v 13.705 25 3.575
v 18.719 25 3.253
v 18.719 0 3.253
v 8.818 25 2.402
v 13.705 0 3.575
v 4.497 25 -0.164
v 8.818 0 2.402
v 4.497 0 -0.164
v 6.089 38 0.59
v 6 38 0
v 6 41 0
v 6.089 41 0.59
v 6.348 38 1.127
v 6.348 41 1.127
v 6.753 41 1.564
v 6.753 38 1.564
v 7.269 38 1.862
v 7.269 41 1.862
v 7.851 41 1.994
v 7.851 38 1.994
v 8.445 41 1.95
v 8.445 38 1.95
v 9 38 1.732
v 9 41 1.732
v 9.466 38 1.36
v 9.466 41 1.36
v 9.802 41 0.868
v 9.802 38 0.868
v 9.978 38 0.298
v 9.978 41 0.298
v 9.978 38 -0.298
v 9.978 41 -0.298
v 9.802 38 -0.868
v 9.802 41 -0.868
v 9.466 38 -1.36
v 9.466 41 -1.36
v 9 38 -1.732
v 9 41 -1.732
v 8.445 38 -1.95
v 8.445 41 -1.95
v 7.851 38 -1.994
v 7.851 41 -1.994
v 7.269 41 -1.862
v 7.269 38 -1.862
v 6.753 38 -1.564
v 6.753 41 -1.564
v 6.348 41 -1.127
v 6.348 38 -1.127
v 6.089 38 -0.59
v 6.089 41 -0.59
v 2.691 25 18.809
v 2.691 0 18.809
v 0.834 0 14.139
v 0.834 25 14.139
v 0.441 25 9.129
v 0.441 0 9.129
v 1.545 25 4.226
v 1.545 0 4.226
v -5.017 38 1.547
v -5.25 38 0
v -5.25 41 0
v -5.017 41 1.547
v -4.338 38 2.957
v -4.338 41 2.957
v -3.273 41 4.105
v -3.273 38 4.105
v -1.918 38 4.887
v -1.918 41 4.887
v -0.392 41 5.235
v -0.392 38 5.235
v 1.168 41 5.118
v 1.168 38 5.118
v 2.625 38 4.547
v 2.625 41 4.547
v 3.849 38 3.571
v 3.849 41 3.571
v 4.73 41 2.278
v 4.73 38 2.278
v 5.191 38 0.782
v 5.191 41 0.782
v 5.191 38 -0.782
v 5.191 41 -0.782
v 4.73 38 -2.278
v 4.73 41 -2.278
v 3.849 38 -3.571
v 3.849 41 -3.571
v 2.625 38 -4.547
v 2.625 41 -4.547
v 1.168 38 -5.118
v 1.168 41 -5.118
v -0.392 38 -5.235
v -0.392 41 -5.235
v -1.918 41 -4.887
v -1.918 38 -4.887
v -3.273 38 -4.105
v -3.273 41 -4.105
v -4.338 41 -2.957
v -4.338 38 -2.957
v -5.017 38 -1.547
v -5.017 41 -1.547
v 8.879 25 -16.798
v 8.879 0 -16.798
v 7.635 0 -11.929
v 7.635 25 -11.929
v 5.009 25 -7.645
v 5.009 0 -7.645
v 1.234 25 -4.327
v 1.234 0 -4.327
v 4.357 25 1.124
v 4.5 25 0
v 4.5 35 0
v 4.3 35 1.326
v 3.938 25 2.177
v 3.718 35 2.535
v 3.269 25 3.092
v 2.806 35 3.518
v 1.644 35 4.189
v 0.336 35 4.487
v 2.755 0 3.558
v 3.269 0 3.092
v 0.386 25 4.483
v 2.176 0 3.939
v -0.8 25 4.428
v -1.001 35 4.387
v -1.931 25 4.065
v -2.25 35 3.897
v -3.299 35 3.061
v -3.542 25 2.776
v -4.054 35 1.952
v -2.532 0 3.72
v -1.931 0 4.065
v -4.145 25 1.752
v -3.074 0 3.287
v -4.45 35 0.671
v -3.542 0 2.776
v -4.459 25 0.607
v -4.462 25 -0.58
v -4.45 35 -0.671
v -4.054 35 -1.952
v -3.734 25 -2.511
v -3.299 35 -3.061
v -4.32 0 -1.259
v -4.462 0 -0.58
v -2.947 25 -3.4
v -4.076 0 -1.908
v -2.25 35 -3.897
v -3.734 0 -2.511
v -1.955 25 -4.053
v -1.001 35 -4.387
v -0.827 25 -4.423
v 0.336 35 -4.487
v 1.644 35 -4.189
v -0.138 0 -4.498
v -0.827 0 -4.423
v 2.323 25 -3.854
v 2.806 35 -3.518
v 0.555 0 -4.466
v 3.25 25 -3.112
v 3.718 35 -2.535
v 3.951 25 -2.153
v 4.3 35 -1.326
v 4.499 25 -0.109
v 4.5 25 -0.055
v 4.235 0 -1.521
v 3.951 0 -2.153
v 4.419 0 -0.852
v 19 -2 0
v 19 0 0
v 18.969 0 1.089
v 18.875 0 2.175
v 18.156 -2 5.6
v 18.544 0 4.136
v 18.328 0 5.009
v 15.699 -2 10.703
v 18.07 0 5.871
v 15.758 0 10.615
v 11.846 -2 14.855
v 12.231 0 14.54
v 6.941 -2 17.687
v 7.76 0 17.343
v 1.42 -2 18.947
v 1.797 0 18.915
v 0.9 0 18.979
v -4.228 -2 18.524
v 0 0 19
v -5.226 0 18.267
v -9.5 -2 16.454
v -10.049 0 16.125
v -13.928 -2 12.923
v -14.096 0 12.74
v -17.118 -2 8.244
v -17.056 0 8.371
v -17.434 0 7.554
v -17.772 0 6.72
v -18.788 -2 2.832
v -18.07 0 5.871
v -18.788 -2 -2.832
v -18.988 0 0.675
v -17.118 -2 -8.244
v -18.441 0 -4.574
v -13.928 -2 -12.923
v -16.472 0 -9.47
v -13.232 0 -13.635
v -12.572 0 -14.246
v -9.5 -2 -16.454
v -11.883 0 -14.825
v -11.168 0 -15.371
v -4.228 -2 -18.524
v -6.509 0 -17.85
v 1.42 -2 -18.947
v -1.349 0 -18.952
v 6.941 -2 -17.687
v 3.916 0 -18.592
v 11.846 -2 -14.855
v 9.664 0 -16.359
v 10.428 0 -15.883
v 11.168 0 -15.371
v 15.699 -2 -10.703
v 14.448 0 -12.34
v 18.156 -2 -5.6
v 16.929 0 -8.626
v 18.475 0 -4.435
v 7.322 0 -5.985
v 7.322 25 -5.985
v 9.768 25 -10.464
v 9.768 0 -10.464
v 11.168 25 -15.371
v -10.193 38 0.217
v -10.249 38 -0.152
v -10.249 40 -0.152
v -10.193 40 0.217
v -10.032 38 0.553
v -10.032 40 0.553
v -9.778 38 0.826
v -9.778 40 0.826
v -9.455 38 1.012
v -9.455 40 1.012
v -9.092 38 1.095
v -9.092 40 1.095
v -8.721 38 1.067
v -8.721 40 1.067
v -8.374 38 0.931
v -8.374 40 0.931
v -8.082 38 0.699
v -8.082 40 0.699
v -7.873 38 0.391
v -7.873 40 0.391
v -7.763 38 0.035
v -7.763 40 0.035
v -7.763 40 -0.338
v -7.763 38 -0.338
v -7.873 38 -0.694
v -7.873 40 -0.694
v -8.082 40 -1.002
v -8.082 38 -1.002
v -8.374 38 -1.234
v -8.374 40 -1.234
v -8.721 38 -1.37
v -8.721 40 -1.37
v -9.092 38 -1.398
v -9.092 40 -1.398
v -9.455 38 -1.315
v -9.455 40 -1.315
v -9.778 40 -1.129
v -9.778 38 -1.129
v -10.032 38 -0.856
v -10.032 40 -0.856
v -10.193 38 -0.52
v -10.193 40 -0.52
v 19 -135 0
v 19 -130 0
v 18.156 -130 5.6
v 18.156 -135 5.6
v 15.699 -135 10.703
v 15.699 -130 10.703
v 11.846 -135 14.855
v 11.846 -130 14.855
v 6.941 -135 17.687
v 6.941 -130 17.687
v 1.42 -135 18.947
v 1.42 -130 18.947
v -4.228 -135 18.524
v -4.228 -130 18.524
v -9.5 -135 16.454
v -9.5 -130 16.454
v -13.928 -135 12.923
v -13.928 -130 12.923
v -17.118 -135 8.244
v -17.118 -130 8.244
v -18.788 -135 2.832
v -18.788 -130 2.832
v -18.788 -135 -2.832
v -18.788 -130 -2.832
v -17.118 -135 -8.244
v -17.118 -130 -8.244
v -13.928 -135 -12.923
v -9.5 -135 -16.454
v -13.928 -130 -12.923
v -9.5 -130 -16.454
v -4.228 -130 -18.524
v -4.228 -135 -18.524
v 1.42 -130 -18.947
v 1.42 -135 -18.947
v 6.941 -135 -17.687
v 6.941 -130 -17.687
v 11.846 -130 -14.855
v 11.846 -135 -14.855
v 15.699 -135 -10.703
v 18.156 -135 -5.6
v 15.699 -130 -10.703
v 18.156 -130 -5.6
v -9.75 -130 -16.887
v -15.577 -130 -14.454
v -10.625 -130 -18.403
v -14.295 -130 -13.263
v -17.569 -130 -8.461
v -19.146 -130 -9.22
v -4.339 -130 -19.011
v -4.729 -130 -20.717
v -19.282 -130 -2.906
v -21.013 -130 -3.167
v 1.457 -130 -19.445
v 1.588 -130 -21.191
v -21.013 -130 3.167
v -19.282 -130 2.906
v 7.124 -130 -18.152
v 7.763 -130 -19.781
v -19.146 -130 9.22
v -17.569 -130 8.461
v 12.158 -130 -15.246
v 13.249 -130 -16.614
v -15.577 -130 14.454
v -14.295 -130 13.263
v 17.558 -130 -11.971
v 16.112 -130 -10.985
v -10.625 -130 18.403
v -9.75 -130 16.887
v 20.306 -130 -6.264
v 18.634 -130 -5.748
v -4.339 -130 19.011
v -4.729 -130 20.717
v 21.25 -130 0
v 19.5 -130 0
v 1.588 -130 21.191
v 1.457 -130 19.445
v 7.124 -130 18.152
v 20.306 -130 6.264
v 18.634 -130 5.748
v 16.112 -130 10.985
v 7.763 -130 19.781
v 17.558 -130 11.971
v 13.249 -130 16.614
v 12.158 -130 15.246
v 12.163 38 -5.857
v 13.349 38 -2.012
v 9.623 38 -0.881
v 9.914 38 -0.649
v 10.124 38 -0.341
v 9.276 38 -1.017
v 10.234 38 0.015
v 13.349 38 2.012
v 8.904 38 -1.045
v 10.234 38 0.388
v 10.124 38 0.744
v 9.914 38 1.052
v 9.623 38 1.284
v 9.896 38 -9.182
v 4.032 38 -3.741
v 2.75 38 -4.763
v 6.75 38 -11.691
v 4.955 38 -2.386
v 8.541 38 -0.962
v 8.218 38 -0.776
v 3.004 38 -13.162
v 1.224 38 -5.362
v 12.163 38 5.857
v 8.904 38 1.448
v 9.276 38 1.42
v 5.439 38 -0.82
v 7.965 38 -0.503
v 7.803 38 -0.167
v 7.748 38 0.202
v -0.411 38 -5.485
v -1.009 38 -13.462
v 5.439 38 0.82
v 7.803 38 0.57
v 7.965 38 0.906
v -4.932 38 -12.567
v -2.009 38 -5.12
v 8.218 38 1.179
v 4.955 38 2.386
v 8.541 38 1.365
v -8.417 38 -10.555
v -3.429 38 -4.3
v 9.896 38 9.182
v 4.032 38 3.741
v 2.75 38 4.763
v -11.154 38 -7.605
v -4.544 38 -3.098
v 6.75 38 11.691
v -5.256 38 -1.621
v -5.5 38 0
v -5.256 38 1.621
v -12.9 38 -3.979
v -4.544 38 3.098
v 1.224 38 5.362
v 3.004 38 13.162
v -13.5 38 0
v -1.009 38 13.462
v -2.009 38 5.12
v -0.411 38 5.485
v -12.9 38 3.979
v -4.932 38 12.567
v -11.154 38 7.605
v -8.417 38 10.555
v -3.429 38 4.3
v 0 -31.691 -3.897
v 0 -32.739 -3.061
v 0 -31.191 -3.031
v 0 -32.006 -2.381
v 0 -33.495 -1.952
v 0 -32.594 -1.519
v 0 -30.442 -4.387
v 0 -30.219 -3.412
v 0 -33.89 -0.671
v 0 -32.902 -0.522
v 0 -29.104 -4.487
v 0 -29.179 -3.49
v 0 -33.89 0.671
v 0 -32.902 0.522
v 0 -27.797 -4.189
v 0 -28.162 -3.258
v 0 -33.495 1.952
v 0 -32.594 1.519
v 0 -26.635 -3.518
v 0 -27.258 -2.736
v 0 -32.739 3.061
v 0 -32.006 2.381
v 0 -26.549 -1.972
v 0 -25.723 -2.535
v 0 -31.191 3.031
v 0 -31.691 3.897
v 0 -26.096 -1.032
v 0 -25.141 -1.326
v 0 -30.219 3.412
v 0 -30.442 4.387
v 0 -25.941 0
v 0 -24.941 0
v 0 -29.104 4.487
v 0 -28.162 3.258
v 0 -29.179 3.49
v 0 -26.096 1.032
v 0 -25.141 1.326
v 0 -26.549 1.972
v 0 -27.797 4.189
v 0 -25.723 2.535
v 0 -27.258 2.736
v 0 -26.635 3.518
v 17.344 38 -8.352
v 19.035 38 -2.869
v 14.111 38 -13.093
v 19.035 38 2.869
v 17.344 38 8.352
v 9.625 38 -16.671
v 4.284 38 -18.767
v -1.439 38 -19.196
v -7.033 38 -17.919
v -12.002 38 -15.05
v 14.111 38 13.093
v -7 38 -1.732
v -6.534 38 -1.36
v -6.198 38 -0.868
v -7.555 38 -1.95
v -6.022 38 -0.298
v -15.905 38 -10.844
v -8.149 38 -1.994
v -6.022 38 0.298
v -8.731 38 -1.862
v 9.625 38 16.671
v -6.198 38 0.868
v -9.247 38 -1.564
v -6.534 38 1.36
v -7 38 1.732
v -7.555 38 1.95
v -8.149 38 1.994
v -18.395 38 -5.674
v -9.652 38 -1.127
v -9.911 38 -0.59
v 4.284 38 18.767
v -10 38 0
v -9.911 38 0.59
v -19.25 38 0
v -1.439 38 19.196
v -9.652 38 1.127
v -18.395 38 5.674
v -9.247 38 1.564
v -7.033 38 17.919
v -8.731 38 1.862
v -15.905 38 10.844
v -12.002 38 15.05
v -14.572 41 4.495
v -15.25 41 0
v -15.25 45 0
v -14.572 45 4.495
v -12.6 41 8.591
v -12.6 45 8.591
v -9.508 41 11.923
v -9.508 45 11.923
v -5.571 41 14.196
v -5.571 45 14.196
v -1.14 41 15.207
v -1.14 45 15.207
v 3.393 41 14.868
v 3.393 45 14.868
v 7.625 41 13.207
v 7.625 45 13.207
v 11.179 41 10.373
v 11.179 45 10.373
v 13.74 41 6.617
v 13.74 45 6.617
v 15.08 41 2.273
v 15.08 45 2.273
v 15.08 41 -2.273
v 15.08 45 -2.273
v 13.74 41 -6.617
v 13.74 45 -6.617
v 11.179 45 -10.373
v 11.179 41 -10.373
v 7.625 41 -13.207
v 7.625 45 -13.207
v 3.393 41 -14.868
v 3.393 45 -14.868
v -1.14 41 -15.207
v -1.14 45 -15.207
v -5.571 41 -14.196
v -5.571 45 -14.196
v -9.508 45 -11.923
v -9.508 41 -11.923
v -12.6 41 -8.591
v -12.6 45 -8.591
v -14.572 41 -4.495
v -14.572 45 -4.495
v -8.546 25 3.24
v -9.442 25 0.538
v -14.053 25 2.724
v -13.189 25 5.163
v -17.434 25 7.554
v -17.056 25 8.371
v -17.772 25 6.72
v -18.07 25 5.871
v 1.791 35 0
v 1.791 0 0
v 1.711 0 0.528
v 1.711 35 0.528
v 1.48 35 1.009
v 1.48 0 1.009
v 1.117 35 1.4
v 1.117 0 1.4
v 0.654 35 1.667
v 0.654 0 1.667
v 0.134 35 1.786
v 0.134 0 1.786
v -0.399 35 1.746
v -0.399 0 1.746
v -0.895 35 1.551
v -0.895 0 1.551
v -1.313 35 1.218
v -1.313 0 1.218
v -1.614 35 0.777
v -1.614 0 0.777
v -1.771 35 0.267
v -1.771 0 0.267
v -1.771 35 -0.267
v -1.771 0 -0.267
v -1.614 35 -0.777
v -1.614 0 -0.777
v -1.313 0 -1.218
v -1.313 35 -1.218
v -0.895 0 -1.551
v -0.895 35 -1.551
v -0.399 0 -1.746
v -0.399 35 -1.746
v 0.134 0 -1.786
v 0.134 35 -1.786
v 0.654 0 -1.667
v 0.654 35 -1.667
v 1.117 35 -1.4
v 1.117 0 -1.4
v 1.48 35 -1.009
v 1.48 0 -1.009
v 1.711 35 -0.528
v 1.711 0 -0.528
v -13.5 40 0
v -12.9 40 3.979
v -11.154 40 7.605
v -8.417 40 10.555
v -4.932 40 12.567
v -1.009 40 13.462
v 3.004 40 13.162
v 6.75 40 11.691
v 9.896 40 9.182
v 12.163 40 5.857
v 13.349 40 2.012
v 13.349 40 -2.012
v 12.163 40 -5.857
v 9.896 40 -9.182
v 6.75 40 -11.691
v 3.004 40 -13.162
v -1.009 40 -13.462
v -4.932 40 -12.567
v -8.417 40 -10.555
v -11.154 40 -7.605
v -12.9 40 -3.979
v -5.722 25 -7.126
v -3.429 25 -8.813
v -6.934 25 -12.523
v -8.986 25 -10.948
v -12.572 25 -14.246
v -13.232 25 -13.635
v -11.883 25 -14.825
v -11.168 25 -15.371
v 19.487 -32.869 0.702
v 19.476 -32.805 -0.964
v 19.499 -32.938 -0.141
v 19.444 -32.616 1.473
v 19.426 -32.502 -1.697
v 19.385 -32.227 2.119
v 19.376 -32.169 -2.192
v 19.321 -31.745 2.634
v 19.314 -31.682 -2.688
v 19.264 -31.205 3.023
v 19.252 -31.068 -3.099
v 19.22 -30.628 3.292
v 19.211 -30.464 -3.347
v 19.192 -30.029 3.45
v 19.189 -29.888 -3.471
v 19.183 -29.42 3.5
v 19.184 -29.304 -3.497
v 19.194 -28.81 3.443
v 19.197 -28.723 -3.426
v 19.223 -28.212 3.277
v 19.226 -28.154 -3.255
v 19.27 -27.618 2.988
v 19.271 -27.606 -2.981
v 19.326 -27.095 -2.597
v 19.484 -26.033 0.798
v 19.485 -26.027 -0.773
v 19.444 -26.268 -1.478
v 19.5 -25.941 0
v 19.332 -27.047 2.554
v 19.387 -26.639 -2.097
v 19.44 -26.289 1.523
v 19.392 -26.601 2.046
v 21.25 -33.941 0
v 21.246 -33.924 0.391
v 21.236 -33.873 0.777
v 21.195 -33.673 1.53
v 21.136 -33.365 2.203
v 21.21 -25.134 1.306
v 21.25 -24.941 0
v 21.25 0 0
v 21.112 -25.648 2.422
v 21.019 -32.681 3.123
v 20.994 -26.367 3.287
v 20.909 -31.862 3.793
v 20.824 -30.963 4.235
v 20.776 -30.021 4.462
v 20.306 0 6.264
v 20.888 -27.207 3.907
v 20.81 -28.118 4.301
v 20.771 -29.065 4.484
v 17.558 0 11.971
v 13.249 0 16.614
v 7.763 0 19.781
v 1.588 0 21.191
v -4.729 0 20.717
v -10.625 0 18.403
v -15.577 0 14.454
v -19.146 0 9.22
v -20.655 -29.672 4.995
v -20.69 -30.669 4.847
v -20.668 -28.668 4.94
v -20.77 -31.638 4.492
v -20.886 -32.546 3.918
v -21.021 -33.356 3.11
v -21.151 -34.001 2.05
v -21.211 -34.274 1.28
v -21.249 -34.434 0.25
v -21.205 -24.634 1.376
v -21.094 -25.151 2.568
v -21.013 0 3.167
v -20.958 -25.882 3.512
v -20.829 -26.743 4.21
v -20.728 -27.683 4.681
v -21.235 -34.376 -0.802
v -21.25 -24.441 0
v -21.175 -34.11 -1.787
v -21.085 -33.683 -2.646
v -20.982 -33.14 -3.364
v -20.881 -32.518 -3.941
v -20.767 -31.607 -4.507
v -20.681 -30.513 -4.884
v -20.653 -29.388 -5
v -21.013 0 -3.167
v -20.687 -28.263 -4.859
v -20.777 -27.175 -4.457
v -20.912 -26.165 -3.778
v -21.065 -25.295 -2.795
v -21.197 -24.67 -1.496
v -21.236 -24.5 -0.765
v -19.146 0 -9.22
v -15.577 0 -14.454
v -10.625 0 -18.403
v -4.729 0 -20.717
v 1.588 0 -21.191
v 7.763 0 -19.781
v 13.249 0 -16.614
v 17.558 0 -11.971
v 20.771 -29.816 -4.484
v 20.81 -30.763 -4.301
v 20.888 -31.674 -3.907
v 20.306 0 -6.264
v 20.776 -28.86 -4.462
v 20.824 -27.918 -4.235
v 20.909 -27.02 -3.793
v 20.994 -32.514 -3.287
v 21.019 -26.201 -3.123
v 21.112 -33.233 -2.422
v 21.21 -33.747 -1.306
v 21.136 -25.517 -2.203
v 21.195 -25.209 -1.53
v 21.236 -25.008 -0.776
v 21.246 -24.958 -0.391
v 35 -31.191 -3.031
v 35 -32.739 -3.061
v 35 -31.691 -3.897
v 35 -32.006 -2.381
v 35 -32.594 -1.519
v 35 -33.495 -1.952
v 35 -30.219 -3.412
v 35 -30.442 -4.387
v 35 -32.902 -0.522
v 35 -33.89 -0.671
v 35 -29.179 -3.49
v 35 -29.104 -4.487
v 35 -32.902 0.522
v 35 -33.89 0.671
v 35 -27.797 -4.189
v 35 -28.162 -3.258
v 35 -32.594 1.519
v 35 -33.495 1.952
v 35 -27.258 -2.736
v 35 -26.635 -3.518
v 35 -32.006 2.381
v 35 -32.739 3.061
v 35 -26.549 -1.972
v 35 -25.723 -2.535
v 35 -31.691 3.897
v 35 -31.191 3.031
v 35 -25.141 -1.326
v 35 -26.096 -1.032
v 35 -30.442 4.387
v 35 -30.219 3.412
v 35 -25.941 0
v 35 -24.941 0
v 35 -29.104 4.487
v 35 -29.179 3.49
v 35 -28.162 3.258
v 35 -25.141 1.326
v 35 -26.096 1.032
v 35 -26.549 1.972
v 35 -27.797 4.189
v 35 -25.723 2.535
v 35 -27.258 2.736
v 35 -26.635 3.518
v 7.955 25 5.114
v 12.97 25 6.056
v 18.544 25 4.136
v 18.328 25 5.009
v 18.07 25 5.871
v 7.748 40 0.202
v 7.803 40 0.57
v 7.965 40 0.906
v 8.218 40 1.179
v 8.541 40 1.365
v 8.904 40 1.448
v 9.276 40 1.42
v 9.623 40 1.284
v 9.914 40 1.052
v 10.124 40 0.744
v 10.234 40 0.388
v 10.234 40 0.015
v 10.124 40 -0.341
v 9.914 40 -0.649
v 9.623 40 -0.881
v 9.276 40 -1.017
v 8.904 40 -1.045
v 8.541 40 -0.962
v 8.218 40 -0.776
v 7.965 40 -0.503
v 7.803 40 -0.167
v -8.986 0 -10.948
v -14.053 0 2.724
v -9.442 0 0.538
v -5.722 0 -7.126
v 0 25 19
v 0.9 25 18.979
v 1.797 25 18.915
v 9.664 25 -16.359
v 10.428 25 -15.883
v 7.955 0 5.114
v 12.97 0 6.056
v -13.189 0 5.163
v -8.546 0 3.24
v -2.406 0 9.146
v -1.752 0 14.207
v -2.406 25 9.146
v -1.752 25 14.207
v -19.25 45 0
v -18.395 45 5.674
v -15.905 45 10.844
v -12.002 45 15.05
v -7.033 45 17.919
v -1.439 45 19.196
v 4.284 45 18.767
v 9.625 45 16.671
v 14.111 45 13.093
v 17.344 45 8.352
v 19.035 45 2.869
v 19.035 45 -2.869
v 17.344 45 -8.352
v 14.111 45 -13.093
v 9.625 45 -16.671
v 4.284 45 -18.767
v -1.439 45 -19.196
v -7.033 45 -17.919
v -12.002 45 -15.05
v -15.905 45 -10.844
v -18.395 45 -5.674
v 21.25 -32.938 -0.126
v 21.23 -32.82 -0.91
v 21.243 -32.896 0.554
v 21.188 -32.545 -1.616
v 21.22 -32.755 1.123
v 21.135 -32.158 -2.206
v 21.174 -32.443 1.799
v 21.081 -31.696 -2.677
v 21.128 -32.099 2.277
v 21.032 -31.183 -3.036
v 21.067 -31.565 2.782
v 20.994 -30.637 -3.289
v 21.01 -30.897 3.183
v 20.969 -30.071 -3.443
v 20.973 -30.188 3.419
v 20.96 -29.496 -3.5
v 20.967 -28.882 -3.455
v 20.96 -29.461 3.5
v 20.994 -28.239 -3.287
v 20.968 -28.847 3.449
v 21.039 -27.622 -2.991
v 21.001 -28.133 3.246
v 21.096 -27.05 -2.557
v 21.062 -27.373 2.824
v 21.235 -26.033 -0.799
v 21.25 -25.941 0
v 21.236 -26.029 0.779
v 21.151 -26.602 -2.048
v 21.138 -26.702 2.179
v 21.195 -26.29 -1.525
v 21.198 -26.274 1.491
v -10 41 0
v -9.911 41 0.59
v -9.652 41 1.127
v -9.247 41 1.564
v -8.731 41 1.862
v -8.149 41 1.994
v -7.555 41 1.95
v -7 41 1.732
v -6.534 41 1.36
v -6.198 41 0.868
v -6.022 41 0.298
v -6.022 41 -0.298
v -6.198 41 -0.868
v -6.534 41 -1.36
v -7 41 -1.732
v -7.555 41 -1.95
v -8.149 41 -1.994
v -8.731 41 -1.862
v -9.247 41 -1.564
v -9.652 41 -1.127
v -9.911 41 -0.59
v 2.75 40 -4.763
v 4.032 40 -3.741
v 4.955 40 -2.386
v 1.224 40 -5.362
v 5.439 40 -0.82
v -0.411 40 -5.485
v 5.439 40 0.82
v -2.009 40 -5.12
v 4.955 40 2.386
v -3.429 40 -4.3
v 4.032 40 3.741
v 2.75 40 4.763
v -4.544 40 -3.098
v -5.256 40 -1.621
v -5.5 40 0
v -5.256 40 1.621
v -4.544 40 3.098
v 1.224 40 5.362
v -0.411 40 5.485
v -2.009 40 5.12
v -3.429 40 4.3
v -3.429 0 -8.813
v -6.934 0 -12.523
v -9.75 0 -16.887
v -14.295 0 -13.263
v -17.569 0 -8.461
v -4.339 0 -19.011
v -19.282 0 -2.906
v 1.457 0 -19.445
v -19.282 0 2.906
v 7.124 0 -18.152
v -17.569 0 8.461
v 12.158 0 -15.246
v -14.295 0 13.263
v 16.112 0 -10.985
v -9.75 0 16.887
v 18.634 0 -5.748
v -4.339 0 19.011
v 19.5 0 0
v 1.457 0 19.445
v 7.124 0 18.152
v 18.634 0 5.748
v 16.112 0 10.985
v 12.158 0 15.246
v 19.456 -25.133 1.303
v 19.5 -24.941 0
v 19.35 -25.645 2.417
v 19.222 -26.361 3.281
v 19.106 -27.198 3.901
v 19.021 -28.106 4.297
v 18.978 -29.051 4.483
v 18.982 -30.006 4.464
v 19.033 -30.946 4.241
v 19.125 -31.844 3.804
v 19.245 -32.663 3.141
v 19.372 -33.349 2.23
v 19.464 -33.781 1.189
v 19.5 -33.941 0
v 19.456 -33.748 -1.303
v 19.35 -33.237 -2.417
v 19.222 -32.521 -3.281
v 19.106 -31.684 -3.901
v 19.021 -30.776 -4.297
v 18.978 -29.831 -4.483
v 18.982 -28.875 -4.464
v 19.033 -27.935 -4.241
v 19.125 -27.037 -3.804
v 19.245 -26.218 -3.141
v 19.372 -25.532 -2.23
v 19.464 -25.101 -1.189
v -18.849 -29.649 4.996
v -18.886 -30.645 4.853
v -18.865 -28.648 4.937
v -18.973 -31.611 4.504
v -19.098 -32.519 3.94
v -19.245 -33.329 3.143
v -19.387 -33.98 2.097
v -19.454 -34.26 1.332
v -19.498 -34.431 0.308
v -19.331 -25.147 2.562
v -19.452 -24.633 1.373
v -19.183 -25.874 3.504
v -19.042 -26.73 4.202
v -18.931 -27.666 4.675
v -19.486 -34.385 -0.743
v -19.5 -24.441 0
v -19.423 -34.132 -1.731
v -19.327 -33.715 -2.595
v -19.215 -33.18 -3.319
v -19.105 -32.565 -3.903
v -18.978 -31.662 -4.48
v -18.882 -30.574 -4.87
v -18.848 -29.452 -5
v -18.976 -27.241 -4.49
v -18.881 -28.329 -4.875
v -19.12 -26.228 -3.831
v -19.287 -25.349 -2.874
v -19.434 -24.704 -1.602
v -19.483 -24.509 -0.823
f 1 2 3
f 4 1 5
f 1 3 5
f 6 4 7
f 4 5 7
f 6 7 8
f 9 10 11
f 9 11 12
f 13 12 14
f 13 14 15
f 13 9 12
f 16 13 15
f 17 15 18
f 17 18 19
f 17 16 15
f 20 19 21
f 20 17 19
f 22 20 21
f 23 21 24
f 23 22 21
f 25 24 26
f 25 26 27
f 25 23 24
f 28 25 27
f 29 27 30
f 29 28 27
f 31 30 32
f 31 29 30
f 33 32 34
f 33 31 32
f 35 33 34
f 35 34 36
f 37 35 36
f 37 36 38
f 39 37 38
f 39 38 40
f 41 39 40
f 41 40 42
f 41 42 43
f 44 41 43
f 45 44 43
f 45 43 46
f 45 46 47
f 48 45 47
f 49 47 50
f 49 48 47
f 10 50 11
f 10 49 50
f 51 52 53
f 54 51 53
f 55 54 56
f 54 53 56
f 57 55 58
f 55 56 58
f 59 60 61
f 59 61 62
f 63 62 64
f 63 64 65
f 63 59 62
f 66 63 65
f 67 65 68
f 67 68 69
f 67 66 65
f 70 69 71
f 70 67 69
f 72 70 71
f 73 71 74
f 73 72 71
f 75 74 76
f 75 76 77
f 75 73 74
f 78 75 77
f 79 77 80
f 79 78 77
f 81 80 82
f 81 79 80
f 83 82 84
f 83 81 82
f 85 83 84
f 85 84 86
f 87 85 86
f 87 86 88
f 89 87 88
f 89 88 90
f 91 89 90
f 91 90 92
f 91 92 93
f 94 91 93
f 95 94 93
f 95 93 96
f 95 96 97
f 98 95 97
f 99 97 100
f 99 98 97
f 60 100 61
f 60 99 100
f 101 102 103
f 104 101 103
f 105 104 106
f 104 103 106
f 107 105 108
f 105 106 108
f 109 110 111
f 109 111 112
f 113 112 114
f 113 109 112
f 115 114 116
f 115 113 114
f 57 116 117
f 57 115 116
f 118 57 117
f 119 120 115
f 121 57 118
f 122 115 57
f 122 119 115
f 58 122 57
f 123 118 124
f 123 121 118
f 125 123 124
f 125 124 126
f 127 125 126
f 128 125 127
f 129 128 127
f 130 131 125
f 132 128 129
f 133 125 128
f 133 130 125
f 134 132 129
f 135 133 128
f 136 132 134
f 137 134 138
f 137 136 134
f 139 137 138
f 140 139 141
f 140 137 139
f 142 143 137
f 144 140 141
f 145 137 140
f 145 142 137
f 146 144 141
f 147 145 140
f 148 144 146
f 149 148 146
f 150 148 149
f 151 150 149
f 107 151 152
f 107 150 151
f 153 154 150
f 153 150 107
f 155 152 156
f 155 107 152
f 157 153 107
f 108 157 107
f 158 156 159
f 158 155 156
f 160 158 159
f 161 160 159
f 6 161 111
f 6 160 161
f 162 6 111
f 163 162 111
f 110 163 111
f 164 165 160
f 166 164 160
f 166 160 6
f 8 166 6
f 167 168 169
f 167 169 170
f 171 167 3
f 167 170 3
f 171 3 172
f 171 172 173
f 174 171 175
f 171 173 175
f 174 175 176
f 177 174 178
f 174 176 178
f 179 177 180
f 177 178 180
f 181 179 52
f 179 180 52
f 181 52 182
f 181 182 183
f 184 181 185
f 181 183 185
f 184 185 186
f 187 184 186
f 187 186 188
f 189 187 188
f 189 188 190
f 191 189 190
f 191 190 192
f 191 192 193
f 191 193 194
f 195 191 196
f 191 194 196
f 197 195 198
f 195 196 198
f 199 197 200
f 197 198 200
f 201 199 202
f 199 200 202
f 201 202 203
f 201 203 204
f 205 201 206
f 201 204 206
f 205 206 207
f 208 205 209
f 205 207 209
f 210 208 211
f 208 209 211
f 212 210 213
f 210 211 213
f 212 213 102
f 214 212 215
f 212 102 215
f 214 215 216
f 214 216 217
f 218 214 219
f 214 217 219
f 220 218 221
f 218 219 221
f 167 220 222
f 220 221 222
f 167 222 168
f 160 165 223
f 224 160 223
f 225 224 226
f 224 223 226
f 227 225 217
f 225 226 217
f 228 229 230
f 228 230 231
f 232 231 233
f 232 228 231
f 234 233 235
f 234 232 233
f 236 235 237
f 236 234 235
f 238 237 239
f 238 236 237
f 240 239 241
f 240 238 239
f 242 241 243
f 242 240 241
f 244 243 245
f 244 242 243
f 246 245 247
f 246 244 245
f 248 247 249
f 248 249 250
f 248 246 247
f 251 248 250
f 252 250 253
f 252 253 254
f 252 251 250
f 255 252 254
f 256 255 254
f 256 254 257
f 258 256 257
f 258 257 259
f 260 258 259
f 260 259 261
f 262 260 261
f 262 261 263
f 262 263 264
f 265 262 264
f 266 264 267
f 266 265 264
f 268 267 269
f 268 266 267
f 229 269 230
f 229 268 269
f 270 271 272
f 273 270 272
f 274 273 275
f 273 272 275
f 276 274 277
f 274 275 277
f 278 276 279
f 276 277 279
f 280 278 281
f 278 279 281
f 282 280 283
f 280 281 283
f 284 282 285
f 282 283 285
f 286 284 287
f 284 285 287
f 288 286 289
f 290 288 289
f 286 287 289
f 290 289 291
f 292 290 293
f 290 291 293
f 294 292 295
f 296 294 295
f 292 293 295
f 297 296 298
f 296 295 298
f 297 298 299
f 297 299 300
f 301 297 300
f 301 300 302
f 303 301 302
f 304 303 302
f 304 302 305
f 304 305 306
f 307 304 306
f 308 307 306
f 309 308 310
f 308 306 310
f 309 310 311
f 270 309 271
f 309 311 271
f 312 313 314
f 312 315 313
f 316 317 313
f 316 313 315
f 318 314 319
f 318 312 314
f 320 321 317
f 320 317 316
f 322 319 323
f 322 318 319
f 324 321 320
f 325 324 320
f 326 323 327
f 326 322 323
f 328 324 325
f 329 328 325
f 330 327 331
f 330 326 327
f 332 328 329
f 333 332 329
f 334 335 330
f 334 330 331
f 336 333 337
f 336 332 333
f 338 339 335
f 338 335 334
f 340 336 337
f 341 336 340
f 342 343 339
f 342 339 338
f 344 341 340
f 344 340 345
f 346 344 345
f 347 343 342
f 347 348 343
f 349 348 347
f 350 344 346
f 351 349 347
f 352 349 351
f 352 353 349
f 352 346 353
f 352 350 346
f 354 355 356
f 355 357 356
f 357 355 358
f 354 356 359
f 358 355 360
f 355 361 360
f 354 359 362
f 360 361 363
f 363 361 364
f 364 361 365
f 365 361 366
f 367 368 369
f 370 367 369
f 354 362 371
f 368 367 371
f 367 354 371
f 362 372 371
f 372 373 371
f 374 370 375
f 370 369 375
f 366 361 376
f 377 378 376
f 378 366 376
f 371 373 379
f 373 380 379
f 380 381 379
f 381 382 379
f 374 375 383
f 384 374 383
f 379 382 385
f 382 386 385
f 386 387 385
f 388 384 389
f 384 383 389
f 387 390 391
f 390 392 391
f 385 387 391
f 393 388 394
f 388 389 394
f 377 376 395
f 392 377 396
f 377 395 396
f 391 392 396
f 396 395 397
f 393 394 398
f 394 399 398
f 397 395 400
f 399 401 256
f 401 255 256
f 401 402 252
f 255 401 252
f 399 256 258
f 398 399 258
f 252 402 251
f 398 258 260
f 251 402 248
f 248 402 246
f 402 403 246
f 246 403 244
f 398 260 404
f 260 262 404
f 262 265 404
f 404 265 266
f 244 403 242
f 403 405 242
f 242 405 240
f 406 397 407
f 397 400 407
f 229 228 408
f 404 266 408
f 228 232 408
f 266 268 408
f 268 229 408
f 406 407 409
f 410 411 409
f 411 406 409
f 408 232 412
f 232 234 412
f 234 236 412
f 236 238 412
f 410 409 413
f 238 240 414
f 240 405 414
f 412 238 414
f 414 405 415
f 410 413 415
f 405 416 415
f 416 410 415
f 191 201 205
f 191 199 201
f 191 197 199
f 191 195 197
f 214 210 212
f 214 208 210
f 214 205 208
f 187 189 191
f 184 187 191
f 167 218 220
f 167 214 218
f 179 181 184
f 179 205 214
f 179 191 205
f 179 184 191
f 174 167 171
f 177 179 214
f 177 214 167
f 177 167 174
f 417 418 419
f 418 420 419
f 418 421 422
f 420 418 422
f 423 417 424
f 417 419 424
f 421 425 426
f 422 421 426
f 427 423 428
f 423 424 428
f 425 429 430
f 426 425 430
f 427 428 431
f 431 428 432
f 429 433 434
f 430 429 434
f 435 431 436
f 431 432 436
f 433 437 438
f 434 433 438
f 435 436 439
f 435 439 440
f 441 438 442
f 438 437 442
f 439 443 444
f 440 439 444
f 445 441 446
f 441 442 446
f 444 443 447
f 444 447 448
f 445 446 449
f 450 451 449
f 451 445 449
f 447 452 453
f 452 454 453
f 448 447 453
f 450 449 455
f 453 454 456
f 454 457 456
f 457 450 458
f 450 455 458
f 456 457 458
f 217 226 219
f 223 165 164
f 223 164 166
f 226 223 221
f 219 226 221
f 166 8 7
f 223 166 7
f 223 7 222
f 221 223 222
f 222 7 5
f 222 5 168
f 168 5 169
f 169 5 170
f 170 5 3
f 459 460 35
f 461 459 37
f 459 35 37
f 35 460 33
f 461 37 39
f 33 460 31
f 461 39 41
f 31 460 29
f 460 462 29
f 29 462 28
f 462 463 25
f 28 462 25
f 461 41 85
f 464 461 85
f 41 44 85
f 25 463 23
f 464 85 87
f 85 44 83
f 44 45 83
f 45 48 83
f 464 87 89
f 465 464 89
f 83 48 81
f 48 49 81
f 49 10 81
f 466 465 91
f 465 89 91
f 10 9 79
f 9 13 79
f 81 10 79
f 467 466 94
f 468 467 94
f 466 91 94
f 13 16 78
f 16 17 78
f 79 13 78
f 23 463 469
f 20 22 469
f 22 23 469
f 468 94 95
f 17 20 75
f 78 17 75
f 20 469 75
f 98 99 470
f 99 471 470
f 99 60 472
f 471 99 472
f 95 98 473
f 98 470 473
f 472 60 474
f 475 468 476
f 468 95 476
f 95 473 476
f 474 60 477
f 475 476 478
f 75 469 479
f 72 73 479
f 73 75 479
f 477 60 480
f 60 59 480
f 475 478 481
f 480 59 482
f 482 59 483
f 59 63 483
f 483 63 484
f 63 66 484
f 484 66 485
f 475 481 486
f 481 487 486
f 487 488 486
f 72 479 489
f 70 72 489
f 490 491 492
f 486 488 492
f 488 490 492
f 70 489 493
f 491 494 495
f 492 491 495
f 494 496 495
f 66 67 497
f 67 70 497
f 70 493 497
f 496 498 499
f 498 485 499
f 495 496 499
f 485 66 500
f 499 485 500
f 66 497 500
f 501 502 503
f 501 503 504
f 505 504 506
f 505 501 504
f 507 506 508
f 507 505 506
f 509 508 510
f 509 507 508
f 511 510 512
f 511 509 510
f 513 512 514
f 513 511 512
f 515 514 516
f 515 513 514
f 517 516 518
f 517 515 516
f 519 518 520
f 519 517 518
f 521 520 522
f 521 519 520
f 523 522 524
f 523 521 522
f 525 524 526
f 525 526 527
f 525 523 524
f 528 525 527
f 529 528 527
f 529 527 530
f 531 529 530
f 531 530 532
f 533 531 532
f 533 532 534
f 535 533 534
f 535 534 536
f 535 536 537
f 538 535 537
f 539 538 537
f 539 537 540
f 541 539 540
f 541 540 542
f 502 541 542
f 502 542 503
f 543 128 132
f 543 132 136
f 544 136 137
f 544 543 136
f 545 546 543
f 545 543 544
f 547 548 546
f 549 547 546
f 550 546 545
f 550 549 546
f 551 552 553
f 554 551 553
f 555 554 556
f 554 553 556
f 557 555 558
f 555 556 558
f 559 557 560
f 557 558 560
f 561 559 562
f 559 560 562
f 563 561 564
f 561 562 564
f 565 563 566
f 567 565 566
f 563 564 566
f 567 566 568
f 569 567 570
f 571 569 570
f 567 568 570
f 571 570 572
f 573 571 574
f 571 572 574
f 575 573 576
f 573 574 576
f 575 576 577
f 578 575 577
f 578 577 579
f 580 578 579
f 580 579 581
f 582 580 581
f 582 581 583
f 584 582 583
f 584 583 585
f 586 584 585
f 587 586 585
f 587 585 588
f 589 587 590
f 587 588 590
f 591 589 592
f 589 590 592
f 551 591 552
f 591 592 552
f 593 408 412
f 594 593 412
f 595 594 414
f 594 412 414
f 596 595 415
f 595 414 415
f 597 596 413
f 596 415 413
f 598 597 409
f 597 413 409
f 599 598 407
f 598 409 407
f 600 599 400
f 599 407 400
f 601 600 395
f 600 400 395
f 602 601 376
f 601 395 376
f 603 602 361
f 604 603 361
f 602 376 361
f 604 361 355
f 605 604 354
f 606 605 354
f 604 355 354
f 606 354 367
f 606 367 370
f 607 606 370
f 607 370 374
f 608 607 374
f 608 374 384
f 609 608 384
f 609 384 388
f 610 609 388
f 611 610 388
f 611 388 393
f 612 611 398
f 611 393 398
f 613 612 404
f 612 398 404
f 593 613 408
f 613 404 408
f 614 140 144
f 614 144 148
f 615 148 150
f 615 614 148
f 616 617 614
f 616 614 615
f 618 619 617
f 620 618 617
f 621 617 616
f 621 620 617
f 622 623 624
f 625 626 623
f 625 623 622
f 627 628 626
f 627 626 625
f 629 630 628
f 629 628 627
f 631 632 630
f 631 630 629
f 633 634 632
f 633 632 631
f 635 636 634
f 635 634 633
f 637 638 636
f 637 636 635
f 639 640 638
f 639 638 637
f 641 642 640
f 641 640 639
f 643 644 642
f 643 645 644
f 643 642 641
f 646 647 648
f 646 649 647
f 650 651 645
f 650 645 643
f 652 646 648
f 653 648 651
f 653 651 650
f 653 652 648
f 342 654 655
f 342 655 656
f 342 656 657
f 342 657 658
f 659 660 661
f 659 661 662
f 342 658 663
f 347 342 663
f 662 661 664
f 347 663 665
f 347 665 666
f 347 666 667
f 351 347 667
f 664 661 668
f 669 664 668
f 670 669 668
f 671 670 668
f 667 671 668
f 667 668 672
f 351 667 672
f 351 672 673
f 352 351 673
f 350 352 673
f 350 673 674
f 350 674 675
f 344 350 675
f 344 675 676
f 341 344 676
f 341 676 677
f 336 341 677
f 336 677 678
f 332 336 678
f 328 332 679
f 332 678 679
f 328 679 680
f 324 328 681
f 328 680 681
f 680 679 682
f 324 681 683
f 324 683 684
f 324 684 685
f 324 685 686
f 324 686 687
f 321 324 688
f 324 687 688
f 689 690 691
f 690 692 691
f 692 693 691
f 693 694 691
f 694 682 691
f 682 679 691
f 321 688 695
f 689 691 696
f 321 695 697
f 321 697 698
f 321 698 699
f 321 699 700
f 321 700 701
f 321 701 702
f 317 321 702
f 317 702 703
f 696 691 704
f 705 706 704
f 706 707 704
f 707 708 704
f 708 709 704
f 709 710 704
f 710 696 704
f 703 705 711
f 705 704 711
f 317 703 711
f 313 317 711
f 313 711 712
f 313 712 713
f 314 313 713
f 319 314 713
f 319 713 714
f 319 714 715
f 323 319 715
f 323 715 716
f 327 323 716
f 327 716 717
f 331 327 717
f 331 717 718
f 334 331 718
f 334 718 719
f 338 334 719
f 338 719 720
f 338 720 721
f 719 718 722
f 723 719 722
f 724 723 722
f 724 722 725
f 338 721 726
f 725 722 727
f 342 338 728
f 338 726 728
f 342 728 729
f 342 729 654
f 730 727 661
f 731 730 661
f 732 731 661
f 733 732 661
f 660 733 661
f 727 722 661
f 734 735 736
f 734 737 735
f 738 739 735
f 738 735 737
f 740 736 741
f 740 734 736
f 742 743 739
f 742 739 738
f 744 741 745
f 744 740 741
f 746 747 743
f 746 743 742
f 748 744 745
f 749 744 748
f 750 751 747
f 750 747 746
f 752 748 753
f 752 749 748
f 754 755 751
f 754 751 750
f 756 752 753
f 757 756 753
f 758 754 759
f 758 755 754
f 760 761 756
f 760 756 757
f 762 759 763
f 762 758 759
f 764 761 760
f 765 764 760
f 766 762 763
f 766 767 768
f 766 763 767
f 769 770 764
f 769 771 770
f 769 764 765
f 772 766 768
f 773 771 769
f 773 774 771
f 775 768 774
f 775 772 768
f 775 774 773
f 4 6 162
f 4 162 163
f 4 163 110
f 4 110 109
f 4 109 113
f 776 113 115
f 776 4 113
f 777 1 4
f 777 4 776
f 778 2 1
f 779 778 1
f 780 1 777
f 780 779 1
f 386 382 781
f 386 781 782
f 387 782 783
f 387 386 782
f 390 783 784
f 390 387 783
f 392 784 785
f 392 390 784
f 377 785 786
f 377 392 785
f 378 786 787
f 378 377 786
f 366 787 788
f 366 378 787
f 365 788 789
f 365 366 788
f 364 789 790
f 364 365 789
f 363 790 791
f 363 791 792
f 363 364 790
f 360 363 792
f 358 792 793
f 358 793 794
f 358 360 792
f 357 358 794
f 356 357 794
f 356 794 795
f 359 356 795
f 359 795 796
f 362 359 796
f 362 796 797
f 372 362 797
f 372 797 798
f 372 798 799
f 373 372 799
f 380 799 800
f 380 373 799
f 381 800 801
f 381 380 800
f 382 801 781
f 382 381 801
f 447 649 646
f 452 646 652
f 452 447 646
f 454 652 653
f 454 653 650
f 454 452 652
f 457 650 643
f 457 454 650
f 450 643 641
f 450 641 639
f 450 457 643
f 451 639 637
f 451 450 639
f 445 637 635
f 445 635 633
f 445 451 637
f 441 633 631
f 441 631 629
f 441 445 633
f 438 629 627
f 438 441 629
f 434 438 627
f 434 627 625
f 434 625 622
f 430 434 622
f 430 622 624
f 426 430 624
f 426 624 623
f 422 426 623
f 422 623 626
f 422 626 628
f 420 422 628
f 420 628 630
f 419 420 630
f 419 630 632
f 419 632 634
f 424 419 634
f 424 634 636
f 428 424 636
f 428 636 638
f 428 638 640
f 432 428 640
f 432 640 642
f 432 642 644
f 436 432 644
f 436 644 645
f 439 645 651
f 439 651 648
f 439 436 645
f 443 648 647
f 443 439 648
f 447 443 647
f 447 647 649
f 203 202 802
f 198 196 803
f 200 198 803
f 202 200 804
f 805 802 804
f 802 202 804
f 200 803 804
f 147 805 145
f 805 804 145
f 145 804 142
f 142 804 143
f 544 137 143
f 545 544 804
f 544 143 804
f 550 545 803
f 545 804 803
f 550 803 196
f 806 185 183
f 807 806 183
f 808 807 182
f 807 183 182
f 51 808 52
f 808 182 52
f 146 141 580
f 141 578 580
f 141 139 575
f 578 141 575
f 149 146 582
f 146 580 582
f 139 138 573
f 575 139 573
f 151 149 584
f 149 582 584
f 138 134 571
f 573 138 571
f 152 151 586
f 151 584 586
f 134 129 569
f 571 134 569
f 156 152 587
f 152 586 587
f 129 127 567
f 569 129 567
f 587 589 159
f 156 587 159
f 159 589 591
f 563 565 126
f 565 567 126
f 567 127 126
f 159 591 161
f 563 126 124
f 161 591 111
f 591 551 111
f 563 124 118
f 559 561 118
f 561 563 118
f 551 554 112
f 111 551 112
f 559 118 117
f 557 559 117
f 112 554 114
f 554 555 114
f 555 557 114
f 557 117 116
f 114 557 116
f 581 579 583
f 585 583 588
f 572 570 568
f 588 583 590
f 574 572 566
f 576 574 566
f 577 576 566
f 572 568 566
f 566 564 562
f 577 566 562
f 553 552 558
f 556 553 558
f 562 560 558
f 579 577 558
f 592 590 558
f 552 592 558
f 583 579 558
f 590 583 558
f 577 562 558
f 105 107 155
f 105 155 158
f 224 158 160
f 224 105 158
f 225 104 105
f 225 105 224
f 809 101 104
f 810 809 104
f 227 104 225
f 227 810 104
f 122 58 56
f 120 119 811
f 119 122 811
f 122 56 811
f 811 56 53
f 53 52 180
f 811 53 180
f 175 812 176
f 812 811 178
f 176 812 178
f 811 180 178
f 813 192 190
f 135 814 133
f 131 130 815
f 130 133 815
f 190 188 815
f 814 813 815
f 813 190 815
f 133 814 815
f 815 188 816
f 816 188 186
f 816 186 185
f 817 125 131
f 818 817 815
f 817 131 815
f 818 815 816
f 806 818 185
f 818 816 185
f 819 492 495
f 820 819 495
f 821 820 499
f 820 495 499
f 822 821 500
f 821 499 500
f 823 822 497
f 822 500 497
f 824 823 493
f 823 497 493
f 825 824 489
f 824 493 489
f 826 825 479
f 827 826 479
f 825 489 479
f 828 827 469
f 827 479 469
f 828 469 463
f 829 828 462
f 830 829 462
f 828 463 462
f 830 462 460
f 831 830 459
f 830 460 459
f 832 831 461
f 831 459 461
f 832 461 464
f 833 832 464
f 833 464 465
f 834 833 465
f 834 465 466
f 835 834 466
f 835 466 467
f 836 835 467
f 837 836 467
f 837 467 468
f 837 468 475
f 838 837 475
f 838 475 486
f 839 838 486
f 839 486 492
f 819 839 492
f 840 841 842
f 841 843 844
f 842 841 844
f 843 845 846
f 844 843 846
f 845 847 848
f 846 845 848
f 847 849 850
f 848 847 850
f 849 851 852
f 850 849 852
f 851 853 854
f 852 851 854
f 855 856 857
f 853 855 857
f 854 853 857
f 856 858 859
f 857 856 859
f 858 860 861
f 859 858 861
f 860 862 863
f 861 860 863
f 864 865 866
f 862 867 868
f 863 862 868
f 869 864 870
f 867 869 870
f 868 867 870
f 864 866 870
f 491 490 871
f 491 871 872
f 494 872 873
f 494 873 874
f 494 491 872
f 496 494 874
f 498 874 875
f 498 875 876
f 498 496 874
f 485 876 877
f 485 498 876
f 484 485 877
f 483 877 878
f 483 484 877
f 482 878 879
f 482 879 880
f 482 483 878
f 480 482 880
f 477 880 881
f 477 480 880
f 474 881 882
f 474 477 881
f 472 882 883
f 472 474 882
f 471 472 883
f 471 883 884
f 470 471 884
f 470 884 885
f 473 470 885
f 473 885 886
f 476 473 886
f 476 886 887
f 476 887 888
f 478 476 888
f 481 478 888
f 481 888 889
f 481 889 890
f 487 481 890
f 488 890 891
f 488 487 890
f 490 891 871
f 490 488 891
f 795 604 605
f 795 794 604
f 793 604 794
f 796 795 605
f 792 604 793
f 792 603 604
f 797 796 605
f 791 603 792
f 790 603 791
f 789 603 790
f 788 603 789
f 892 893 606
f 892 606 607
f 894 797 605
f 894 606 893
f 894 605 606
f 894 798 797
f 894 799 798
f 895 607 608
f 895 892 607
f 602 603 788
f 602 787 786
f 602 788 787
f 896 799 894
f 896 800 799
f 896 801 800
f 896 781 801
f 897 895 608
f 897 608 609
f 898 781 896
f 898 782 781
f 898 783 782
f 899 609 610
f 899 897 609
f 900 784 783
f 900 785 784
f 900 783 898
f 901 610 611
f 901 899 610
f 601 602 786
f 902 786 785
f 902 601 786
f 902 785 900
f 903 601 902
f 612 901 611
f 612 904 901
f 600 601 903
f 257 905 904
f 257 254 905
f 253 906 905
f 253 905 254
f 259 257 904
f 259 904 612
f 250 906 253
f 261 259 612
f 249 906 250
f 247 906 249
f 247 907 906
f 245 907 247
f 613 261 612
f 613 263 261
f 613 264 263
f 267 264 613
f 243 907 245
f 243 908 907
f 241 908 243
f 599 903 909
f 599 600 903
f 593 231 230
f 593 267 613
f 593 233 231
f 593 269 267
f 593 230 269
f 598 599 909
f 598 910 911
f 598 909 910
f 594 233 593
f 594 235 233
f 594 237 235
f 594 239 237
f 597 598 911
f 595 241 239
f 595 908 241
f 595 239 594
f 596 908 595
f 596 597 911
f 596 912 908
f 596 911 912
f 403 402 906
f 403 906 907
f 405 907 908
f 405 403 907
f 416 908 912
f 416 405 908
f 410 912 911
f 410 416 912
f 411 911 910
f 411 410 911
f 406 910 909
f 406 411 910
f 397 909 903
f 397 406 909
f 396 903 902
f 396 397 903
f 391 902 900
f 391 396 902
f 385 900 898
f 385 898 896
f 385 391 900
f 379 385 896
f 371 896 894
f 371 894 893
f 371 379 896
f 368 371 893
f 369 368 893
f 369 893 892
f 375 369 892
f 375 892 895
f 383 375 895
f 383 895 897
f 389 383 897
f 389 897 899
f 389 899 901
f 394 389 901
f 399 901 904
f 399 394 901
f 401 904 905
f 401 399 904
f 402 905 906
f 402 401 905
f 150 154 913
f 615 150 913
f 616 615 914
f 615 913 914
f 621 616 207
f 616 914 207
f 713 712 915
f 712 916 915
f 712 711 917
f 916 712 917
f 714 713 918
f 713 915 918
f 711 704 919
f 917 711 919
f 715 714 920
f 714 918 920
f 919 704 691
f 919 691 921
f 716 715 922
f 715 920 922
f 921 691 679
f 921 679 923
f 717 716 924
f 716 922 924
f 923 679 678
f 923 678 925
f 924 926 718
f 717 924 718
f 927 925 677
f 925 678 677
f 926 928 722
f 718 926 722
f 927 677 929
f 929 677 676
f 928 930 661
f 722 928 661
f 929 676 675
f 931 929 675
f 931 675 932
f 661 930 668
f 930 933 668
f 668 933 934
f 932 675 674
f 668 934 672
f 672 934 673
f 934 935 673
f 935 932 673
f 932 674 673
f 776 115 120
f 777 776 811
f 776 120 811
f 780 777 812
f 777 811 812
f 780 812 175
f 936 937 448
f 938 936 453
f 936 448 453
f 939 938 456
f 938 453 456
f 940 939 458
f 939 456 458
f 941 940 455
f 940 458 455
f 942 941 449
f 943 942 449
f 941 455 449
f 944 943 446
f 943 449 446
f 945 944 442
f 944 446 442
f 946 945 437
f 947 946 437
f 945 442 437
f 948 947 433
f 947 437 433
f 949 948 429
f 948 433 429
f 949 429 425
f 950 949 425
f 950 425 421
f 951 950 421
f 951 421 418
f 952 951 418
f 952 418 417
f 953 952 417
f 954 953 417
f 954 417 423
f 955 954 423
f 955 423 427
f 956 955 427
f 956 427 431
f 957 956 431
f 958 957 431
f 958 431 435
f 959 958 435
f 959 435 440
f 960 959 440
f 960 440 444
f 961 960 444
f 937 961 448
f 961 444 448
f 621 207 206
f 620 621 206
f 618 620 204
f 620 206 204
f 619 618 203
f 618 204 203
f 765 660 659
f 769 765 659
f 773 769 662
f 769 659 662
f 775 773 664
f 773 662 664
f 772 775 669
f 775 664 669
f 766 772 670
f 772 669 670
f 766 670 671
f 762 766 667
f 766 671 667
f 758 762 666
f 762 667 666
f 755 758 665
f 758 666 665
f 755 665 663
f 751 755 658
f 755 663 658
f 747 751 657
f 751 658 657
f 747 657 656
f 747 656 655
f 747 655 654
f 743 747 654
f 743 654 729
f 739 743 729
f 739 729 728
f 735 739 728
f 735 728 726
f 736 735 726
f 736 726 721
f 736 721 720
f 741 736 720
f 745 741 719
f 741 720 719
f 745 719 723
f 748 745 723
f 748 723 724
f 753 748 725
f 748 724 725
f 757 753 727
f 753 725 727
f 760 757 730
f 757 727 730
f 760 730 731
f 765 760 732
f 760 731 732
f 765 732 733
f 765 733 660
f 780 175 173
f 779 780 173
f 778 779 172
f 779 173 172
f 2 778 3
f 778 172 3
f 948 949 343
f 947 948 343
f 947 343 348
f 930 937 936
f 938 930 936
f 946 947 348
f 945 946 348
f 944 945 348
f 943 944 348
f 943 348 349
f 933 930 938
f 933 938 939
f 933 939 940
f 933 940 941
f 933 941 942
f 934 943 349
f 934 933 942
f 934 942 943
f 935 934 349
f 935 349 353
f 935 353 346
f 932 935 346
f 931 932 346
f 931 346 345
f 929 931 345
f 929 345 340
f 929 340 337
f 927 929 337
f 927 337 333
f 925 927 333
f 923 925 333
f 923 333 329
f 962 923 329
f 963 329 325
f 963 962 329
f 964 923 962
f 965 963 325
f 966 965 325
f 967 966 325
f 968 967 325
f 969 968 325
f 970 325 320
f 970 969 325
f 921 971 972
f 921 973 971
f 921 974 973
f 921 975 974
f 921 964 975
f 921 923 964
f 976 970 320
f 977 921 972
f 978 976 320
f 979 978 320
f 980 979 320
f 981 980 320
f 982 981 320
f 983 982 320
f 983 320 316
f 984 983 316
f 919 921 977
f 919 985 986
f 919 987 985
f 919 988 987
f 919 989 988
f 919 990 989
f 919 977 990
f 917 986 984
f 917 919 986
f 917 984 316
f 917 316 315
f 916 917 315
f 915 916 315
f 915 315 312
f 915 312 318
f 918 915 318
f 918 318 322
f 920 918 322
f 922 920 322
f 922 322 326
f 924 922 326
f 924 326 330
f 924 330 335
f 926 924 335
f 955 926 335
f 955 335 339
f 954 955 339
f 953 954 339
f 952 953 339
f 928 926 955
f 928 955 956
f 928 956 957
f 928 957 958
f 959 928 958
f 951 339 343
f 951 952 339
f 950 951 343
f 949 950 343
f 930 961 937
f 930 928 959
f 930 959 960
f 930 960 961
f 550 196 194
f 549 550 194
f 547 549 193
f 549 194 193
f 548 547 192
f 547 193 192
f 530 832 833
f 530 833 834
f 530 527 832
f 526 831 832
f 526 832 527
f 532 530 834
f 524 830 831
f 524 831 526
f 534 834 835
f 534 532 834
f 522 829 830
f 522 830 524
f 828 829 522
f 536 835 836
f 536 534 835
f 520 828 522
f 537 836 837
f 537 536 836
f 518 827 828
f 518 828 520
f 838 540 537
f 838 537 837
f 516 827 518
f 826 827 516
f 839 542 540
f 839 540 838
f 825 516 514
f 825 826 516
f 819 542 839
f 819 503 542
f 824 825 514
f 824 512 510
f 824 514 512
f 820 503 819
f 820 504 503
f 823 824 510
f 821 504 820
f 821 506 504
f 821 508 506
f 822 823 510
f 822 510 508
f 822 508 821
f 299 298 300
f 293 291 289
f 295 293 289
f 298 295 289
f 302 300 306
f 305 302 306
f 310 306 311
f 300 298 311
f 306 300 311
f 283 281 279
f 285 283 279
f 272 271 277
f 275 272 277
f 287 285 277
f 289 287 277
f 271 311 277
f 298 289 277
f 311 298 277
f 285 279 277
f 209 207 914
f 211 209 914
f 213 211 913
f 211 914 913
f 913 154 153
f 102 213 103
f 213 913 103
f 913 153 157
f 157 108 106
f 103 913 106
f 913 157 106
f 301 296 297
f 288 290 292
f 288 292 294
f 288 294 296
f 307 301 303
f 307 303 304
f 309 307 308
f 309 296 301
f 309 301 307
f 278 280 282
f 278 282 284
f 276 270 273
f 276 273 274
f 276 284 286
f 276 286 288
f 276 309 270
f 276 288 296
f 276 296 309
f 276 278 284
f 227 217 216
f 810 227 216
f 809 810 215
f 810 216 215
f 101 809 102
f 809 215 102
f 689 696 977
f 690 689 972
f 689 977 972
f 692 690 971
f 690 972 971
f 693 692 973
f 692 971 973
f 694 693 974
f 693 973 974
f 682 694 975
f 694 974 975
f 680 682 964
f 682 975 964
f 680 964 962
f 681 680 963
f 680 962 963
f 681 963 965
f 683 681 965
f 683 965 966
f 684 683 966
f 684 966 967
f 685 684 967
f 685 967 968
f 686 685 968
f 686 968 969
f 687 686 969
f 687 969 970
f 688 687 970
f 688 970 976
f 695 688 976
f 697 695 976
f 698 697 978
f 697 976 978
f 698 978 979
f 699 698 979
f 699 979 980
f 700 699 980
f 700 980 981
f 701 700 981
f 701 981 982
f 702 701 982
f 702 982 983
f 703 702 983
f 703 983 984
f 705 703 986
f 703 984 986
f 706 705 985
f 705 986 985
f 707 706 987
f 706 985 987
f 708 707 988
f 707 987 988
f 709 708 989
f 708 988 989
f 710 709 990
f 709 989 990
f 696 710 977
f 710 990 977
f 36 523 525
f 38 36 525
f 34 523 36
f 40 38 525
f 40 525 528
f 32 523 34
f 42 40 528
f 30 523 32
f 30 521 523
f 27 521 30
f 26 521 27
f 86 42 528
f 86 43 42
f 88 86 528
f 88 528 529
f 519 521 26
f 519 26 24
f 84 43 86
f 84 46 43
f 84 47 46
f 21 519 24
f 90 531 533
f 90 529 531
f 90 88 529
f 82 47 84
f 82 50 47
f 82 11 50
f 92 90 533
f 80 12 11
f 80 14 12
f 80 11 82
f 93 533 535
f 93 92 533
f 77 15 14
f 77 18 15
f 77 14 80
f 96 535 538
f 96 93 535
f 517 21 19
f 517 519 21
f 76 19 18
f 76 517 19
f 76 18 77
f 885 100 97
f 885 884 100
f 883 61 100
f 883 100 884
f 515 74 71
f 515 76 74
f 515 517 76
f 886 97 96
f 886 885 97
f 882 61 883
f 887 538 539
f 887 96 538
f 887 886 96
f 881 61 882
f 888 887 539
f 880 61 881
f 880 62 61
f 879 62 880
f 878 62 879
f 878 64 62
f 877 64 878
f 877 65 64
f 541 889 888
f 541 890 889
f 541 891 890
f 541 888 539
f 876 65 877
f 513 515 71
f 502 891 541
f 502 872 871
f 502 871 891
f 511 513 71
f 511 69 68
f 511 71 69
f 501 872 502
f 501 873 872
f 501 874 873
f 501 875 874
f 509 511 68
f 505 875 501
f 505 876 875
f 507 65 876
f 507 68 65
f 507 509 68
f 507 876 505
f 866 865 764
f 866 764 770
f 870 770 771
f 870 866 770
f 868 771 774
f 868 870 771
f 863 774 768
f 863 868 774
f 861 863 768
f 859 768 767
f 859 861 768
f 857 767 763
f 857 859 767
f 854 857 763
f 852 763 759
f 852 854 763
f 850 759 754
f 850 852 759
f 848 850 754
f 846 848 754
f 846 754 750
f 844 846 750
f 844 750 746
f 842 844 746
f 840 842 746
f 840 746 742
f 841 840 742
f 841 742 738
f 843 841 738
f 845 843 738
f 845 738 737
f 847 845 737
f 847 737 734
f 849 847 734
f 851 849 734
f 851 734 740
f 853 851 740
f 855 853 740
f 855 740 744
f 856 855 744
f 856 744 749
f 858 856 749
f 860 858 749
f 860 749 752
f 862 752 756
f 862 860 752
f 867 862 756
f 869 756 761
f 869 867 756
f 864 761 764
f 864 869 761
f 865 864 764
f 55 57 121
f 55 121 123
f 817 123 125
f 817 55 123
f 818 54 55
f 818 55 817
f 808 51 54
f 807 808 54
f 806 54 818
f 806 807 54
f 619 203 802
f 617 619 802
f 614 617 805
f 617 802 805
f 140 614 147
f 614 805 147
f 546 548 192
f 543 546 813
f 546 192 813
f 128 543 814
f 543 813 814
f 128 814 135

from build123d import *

# Parameters (mm, degrees)
F0_R      = 21.25
F0_R_2    = 19.5
F1_DEPTH  = 130
F2_R      = 19
F3_DEPTH  = 2
F6_DEPTH  = 25
F7_COUNT  = 5
F8_R      = 4.5
F8_R_2    = 1.7909602392
F9_DEPTH  = 35
F11_R     = 13.5
F11_R_2   = 1.25
F11_R_3   = 5.5
F12_DEPTH = 2
F13_R     = 19
F14_DEPTH = 5
F15_R     = 19.25
F15_R_2   = 2
F15_R_3   = 5.25
F17_DEPTH = 3
F16_R     = 19.25
F16_R_2   = 15.25
F18_DEPTH = 7
F19_R     = 5
F20_DEPTH = 25
F21_R     = 4.5
F21_R_2   = 3.5
F22_DEPTH = 35


with BuildPart() as f1:
    # F0 (on Front) → F1 (new body)
    with BuildSketch(Plane.XZ):
        Circle(F0_R)
        Circle(F0_R_2, mode=Mode.SUBTRACT)
    extrude(amount=F1_DEPTH)

    # F19 (on Right) → F20 (cut)
    with BuildSketch(Plane.YZ):
        with Locations((-29.4406684911, 0)):
            Circle(F19_R)
    extrude(amount=-F20_DEPTH, mode=Mode.SUBTRACT)

    # F21 (on Right) → F22 (join)
    with BuildSketch(Plane.YZ):
        with Locations((-29.4406684911, 0)):
            Circle(F21_R)
        with Locations((-29.4406684911, 0)):
            Circle(F21_R_2, mode=Mode.SUBTRACT)
    extrude(amount=F22_DEPTH)


with BuildPart() as f3:
    # F2 (on Front) → F3 (new body)
    with BuildSketch(Plane.XZ):
        Circle(F2_R)
    extrude(amount=F3_DEPTH)

    # F5 (on face) → F6 (join)
    with BuildSketch(Plane(origin=(0, 0, 0), x_dir=(-1, 0, 0), z_dir=(0, 1, 0))):
        with BuildLine():
            ThreePointArc((-1.8208355153, 3.5615387161), (0, 4), (1.8208355153, 3.5615387161))
            ThreePointArc((1.8208355153, 3.5615387161), (2.2507159796, 11.4388461611), (0, 19))
            ThreePointArc((0, 19), (-1.3487526298, 18.9520676008), (-2.690700107, 18.8085122467))
            ThreePointArc((-2.690700107, 18.8085122467), (-0.4251484769, 11.2894652862), (-1.8208355153, 3.5615387161))
        make_face()
    extrude(amount=F6_DEPTH)


with BuildPart() as f7_1:
    # F7: instance of F3
    add(f3.part.rotate(Axis((0, 13.0243711174, 0), (0, 1, 0)), 1 * 360 / F7_COUNT))


with BuildPart() as f7_2:
    # F7: instance of F3
    add(f3.part.rotate(Axis((0, 13.0243711174, 0), (0, 1, 0)), 2 * 360 / F7_COUNT))


with BuildPart() as f7_3:
    # F7: instance of F3
    add(f3.part.rotate(Axis((0, 13.0243711174, 0), (0, 1, 0)), 3 * 360 / F7_COUNT))


with BuildPart() as f7_4:
    # F7: instance of F3
    add(f3.part.rotate(Axis((0, 13.0243711174, 0), (0, 1, 0)), 4 * 360 / F7_COUNT))


with BuildPart() as f3_1:
    add(f3.part)

    add(f7_1.part)  # F9 merges F7_1

    add(f7_2.part)  # F9 merges F7_2

    add(f7_3.part)  # F9 merges F7_3

    add(f7_4.part)  # F9 merges F7_4
    # F8 (on Front) → F9 (join)
    with BuildSketch(Plane.XZ):
        Circle(F8_R)
        Circle(F8_R_2, mode=Mode.SUBTRACT)
    extrude(amount=-F9_DEPTH)


with BuildPart() as f12:
    # F11 (on offset) → F12 (new body)
    with BuildSketch(Plane(origin=(0, 38, 0), x_dir=(-1, 0, 0), z_dir=(0, 1, 0))):
        Circle(F11_R)
        with Locations((8.9987234333, -0.1515802457)):
            Circle(F11_R_2, mode=Mode.SUBTRACT)
        with Locations((-8.9977424343, 0.2015715413)):
            Circle(F11_R_2, mode=Mode.SUBTRACT)
        Circle(F11_R_3, mode=Mode.SUBTRACT)
    extrude(amount=F12_DEPTH)


with BuildPart() as f14:
    # F13 (on face) → F14 (new body)
    with BuildSketch(Plane.XZ.offset(130)):
        Circle(F13_R)
    extrude(amount=F14_DEPTH)


with BuildPart() as f17:
    # F15 (on offset) → F17 (new body)
    with BuildSketch(Plane(origin=(0, 38, 0), x_dir=(-1, 0, 0), z_dir=(0, 1, 0))):
        Circle(F15_R)
        with Locations((-8, 0)):
            Circle(F15_R_2, mode=Mode.SUBTRACT)
        Circle(F15_R_3, mode=Mode.SUBTRACT)
        with Locations((8, 0)):
            Circle(F15_R_2, mode=Mode.SUBTRACT)
    extrude(amount=F17_DEPTH)

    # F16 (on face) → F18 (join)
    with BuildSketch(Plane(origin=(0, 38, 0), x_dir=(-1, 0, 0), z_dir=(0, 1, 0))):
        Circle(F16_R)
        Circle(F16_R_2, mode=Mode.SUBTRACT)
    extrude(amount=F18_DEPTH)


solid = Compound([f1.part, f3_1.part, f12.part, f14.part, f17.part])
